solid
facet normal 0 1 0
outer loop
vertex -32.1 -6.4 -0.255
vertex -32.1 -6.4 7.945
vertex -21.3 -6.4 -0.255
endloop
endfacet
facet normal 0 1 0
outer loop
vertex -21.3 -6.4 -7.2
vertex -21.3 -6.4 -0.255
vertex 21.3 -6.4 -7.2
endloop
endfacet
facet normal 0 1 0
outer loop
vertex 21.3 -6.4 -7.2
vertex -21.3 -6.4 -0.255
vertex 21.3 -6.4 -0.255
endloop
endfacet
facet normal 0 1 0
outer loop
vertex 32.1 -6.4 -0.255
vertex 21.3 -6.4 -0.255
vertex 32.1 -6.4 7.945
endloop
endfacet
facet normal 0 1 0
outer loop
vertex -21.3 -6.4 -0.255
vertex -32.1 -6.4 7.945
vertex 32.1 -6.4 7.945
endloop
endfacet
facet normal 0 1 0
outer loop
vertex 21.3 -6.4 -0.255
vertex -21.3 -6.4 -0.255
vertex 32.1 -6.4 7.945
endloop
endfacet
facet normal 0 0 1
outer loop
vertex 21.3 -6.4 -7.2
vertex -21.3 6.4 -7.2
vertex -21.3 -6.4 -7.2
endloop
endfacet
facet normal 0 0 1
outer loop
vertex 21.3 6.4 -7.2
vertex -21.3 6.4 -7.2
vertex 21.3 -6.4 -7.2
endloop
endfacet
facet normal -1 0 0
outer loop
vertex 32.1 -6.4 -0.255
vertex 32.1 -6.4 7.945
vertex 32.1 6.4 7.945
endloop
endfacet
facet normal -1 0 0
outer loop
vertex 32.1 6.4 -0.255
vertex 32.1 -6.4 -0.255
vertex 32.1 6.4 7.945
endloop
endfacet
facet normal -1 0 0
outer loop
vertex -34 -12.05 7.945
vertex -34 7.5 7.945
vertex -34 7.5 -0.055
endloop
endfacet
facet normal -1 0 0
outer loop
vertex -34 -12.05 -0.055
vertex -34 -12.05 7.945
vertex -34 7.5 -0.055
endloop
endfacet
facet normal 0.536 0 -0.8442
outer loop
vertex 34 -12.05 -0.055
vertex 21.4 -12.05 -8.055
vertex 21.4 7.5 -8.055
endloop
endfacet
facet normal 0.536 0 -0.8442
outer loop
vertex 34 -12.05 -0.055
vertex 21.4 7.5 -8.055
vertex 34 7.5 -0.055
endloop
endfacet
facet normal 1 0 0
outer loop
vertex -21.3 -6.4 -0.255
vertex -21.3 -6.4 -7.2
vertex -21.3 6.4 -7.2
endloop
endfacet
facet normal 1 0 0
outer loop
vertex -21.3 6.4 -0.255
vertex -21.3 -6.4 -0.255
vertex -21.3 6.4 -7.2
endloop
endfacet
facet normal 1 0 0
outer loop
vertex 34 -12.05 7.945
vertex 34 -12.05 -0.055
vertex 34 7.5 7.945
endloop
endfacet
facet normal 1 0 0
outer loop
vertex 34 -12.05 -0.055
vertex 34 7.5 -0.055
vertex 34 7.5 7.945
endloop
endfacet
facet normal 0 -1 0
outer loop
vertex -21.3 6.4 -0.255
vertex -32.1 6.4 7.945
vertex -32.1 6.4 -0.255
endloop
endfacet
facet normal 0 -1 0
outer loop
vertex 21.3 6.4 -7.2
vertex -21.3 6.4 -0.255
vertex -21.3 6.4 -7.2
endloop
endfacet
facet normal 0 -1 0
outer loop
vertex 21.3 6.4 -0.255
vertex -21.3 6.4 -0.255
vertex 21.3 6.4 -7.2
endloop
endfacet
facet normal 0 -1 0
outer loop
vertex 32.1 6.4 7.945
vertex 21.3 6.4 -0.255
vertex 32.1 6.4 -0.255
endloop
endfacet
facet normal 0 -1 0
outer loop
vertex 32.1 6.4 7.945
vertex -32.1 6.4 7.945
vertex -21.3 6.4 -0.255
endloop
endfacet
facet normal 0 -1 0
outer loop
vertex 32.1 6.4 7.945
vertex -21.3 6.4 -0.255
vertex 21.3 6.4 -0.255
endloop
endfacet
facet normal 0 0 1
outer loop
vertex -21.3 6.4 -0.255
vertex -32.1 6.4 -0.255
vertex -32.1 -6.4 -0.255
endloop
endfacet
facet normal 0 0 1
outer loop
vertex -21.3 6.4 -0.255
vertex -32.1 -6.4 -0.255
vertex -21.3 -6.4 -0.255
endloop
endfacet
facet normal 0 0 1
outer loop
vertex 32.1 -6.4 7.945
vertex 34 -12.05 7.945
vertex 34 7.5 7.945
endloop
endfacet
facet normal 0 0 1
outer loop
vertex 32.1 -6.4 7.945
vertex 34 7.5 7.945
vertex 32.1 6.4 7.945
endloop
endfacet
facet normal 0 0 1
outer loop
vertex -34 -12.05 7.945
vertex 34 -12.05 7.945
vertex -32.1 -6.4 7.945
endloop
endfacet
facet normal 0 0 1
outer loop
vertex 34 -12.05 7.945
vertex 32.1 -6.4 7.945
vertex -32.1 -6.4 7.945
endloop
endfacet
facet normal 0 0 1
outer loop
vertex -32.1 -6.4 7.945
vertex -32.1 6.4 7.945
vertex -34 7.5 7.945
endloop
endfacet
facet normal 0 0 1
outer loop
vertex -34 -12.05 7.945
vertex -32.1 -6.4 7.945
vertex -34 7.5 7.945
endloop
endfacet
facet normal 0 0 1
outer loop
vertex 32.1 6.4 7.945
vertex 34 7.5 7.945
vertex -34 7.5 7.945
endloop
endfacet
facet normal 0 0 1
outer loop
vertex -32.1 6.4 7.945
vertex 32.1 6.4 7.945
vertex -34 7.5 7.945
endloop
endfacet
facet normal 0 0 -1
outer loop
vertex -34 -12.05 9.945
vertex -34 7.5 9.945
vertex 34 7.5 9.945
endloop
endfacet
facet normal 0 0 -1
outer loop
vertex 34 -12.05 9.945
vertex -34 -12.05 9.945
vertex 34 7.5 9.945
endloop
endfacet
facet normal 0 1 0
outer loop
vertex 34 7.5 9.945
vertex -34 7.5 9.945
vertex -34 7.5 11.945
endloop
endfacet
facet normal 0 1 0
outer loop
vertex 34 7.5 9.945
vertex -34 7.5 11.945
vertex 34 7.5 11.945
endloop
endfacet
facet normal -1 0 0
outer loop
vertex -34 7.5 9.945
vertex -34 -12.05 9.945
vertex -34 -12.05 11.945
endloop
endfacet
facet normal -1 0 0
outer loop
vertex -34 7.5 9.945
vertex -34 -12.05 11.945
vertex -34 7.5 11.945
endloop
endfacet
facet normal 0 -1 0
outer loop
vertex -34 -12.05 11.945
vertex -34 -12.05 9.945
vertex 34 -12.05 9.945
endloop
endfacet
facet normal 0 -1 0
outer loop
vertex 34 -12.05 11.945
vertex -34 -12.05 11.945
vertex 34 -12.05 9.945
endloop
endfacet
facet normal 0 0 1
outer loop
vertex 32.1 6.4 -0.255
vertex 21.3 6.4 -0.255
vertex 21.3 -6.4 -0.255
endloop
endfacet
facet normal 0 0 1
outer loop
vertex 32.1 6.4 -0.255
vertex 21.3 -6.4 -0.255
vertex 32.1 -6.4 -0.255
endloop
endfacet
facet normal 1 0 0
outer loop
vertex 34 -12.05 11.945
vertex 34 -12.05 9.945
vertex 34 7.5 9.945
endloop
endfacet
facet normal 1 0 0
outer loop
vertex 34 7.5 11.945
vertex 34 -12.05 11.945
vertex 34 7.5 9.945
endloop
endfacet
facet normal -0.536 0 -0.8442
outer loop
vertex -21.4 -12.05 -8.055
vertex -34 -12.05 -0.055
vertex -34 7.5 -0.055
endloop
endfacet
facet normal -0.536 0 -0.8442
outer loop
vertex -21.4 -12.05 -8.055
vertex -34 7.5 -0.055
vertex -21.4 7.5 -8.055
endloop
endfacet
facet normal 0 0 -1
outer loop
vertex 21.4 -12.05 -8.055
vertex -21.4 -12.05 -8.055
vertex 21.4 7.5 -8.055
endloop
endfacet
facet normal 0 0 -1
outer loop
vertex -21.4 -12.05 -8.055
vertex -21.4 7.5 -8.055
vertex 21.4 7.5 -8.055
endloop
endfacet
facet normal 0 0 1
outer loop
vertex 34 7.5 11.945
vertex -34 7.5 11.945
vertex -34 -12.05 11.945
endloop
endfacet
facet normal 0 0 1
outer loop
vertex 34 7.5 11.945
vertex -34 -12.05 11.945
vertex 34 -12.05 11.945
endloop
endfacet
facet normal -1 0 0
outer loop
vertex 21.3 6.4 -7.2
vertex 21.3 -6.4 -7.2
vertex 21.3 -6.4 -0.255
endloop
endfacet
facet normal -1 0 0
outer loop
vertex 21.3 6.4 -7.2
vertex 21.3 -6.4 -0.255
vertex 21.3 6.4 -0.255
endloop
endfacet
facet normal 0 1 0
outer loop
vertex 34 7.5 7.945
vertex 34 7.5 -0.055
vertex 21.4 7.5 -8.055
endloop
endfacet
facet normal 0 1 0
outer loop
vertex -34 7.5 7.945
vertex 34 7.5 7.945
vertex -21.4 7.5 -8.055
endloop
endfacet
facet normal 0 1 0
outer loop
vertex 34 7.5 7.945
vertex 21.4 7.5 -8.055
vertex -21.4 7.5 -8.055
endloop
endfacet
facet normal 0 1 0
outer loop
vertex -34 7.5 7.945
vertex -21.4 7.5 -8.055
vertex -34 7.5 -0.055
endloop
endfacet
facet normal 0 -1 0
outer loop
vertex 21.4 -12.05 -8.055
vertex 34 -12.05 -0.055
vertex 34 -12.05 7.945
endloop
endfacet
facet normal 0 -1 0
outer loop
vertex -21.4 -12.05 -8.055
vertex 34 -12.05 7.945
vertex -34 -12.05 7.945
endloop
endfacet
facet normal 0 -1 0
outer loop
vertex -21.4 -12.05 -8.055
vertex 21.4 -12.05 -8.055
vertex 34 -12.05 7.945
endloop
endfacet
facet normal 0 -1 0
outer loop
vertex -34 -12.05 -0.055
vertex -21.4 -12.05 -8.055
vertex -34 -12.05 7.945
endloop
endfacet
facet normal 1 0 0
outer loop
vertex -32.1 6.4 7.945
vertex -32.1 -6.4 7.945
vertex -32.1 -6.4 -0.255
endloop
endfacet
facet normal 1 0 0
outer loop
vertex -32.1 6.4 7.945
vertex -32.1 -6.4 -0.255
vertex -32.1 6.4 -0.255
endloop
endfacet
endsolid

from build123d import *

# Parameters (mm, degrees)
BOSS_EXTRUDE1_DEPTH      = 7.5
BOSS_EXTRUDE1_DEPTH_BACK = 12.05
SKETCH1_W                = 42.6
SKETCH1_H                = 12.8
CUT_EXTRUDE1_DEPTH       = 7.2
SKETCH1_2_W              = 42.6
SKETCH1_2_H              = 12.8
CUT_EXTRUDE2_DEPTH       = 37.960677854
SKETCH3_W                = 64.2
SKETCH3_H                = 12.8
CUT_EXTRUDE3_DEPTH       = 8.2
BOSS_EXTRUDE2_START      = 2
SKETCH4_W                = 68
SKETCH4_H                = 19.55
BOSS_EXTRUDE2_DEPTH      = 2


with BuildPart() as part:
    # Sketch2 → Boss-Extrude1 (new, two sides: drawn at the far end of the back side and taken through both)
    with BuildSketch(Plane(origin=(0, 0, 0), x_dir=(1, 0, 0), z_dir=(0, 1, 0)).offset(-BOSS_EXTRUDE1_DEPTH_BACK)):
        Polygon((-34, 0.055383753), (-21.4, 8.055383753), (21.4, 8.055383753), (34, 0.055383753), (34, -7.944616247), (-34, -7.944616247), align=None)
    extrude(amount=BOSS_EXTRUDE1_DEPTH + BOSS_EXTRUDE1_DEPTH_BACK)

    # Sketch1 → Cut-Extrude1 (cut)
    with BuildSketch(Plane.XY):
        Rectangle(SKETCH1_W, SKETCH1_H)
    extrude(amount=-CUT_EXTRUDE1_DEPTH, mode=Mode.SUBTRACT)

    # Sketch1<2> → Cut-Extrude2 (cut, through all)
    with BuildSketch(Plane.XY):
        Rectangle(SKETCH1_2_W, SKETCH1_2_H)
    extrude(amount=CUT_EXTRUDE2_DEPTH, mode=Mode.SUBTRACT)

    # Sketch3 → Cut-Extrude3 (cut)
    with BuildSketch(Plane.XY.offset(7.944616247)):
        Rectangle(SKETCH3_W, SKETCH3_H)
    extrude(amount=-CUT_EXTRUDE3_DEPTH, mode=Mode.SUBTRACT)


with BuildPart() as body_2:
    # Sketch4 → Boss-Extrude2 (new body)
    with BuildSketch(Plane.XY.offset(7.944616247).offset(BOSS_EXTRUDE2_START)):
        with Locations((0, -2.275)):
            Rectangle(SKETCH4_W, SKETCH4_H)
    extrude(amount=BOSS_EXTRUDE2_DEPTH)


solid = Compound([part.part, body_2.part])
